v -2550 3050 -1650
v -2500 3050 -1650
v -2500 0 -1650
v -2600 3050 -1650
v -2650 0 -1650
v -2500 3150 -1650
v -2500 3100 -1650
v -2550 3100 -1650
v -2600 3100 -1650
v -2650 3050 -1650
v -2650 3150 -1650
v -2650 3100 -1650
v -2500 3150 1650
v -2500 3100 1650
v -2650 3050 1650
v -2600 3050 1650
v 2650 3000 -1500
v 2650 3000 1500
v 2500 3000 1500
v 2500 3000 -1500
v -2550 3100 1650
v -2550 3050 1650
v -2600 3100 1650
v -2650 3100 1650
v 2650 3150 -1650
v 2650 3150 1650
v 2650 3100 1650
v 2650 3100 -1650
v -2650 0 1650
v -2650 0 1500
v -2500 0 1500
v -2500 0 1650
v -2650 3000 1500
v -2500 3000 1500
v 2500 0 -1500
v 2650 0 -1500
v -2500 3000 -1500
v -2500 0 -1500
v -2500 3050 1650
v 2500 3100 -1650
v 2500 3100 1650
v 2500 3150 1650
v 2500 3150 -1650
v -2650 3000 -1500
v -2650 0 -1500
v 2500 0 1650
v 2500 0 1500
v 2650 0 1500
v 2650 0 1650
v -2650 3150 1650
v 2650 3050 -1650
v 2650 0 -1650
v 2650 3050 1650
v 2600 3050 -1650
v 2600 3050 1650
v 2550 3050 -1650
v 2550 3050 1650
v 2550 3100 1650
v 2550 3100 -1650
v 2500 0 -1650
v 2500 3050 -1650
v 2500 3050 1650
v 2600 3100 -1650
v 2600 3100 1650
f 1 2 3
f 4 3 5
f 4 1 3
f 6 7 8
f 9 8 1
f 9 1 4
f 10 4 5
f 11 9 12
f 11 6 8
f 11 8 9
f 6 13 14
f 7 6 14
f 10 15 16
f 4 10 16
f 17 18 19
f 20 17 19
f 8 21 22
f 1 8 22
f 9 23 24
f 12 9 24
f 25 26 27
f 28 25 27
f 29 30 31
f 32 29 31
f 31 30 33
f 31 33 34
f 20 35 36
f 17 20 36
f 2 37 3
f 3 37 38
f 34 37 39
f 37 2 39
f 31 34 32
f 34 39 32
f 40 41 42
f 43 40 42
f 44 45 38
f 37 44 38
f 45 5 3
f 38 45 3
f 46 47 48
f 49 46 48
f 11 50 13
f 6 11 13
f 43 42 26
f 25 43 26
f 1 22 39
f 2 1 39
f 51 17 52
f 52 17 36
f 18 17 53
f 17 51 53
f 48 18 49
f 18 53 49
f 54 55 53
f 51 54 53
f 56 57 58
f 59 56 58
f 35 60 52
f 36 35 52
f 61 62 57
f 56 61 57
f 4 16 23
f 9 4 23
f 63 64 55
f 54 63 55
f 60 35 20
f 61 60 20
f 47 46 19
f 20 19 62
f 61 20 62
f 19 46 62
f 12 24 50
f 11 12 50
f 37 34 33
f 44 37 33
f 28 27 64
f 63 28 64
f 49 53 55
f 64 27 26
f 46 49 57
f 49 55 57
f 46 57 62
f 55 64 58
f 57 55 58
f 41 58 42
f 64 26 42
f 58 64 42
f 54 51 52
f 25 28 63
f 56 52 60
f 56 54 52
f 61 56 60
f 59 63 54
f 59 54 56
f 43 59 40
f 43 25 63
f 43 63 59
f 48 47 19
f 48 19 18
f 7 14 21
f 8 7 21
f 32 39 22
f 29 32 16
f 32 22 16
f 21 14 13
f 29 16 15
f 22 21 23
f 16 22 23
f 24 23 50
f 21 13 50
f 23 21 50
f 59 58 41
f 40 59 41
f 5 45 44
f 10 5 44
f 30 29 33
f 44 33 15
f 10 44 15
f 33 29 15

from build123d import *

# Parameters (mm, degrees)
SKETCH1_W             = 150
SKETCH1_H             = 150
BOSS_EXTRUDE1_DEPTH   = 3000
BOSS_EXTRUDE1_2_DEPTH = 3000
BOSS_EXTRUDE1_3_DEPTH = 3000
BOSS_EXTRUDE1_4_DEPTH = 3000
BOSS_EXTRUDE2_DEPTH   = 3300


with BuildPart() as part:
    # Sketch1 → Boss-Extrude1 (new body)
    with BuildSketch(Plane(origin=(0, 0, 0), x_dir=(1, 0, 0), z_dir=(0, 1, 0))):
        with Locations((-2575, 1575)):
            Rectangle(SKETCH1_W, SKETCH1_H)
    extrude(amount=BOSS_EXTRUDE1_DEPTH)



with BuildPart() as body_2:
    # Sketch1 → Boss-Extrude1 2 (new body)
    with BuildSketch(Plane(origin=(0, 0, 0), x_dir=(1, 0, 0), z_dir=(0, 1, 0))):
        with Locations((-2575, -1575)):
            Rectangle(SKETCH1_W, SKETCH1_H)
    extrude(amount=BOSS_EXTRUDE1_2_DEPTH)


with BuildPart() as body_3:
    # Sketch1 → Boss-Extrude1 3 (new body)
    with BuildSketch(Plane(origin=(0, 0, 0), x_dir=(1, 0, 0), z_dir=(0, 1, 0))):
        with Locations((2575, 1575)):
            Rectangle(SKETCH1_W, SKETCH1_H)
    extrude(amount=BOSS_EXTRUDE1_3_DEPTH)


with BuildPart() as body_4:
    # Sketch1 → Boss-Extrude1 4 (new body)
    with BuildSketch(Plane(origin=(0, 0, 0), x_dir=(1, 0, 0), z_dir=(0, 1, 0))):
        with Locations((2575, -1575)):
            Rectangle(SKETCH1_W, SKETCH1_H)
    extrude(amount=BOSS_EXTRUDE1_4_DEPTH)


with BuildPart() as part_1:
    add(part.part)

    add(body_2.part)  # Boss-Extrude2 merges body 2

    add(body_3.part)  # Boss-Extrude2 merges body 3

    add(body_4.part)  # Boss-Extrude2 merges body 4
    # Sketch2 → Boss-Extrude2 (add)
    with BuildSketch(Plane.XY.offset(1650)):
        Polygon((-2500, 3000), (-2650, 3000), (-2650, 3050), (-2600, 3050), (-2600, 3100), (-2650, 3100), (-2650, 3150), (-2500, 3150), (-2500, 3100), (-2550, 3100), (-2550, 3050), (-2500, 3050), align=None)
        Polygon((2500, 3150), (2650, 3150), (2650, 3100), (2600, 3100), (2600, 3050), (2650, 3050), (2650, 3000), (2500, 3000), (2500, 3050), (2550, 3050), (2550, 3100), (2500, 3100), align=None)
    extrude(amount=-BOSS_EXTRUDE2_DEPTH)


solid = part_1.part
